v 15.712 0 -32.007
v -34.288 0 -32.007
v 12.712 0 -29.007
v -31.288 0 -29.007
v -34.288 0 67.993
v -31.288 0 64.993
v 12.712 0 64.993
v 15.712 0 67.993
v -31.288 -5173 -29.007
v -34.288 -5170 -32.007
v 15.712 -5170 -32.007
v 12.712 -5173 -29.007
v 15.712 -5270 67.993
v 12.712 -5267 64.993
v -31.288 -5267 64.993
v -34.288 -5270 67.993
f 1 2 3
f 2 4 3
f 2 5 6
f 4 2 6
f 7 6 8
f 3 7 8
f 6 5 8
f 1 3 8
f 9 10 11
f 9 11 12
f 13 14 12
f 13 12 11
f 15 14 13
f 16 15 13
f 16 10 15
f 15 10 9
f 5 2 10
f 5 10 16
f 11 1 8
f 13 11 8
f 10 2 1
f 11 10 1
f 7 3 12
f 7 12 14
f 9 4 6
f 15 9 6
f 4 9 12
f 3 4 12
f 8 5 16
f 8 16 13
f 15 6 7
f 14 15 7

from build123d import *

# Parameters (mm, degrees)
F0_W        = 50
F0_H        = 100
F0_W_2      = 44
F0_H_2      = 94
F1_DEPTH    = 5270
F2_T1_DEPTH = 564.3365975932


# Not quite as in the source:
# - a fillet or chamfer that OpenCascade refuses, or shapes differently, is made with other operations: its cross-section is extruded or revolved along the edge and cut away or added


with BuildPart() as f1:
    # F0 (on Front) → F1 (new body)
    with BuildSketch(Plane.XZ):
        with Locations((-9.287606366, 17.9927872233)):
            Rectangle(F0_W, F0_H)
        with Locations((-9.287606366, 17.9927872233)):
            Rectangle(F0_W_2, F0_H_2, mode=Mode.SUBTRACT)
    extrude(amount=F1_DEPTH)

    # F2: chamfer of 100 on 1 edges, made by hand

    # F2_s2 → F2_t1 (cut)
    with BuildSketch(Plane.YZ.offset(-291.4559051626)):
        Polygon((-5170, -32.0072127767), (-5270, 67.9927872233), (-5270, -32.0072127767), align=None)
    extrude(amount=F2_T1_DEPTH, mode=Mode.SUBTRACT)


solid = f1.part
